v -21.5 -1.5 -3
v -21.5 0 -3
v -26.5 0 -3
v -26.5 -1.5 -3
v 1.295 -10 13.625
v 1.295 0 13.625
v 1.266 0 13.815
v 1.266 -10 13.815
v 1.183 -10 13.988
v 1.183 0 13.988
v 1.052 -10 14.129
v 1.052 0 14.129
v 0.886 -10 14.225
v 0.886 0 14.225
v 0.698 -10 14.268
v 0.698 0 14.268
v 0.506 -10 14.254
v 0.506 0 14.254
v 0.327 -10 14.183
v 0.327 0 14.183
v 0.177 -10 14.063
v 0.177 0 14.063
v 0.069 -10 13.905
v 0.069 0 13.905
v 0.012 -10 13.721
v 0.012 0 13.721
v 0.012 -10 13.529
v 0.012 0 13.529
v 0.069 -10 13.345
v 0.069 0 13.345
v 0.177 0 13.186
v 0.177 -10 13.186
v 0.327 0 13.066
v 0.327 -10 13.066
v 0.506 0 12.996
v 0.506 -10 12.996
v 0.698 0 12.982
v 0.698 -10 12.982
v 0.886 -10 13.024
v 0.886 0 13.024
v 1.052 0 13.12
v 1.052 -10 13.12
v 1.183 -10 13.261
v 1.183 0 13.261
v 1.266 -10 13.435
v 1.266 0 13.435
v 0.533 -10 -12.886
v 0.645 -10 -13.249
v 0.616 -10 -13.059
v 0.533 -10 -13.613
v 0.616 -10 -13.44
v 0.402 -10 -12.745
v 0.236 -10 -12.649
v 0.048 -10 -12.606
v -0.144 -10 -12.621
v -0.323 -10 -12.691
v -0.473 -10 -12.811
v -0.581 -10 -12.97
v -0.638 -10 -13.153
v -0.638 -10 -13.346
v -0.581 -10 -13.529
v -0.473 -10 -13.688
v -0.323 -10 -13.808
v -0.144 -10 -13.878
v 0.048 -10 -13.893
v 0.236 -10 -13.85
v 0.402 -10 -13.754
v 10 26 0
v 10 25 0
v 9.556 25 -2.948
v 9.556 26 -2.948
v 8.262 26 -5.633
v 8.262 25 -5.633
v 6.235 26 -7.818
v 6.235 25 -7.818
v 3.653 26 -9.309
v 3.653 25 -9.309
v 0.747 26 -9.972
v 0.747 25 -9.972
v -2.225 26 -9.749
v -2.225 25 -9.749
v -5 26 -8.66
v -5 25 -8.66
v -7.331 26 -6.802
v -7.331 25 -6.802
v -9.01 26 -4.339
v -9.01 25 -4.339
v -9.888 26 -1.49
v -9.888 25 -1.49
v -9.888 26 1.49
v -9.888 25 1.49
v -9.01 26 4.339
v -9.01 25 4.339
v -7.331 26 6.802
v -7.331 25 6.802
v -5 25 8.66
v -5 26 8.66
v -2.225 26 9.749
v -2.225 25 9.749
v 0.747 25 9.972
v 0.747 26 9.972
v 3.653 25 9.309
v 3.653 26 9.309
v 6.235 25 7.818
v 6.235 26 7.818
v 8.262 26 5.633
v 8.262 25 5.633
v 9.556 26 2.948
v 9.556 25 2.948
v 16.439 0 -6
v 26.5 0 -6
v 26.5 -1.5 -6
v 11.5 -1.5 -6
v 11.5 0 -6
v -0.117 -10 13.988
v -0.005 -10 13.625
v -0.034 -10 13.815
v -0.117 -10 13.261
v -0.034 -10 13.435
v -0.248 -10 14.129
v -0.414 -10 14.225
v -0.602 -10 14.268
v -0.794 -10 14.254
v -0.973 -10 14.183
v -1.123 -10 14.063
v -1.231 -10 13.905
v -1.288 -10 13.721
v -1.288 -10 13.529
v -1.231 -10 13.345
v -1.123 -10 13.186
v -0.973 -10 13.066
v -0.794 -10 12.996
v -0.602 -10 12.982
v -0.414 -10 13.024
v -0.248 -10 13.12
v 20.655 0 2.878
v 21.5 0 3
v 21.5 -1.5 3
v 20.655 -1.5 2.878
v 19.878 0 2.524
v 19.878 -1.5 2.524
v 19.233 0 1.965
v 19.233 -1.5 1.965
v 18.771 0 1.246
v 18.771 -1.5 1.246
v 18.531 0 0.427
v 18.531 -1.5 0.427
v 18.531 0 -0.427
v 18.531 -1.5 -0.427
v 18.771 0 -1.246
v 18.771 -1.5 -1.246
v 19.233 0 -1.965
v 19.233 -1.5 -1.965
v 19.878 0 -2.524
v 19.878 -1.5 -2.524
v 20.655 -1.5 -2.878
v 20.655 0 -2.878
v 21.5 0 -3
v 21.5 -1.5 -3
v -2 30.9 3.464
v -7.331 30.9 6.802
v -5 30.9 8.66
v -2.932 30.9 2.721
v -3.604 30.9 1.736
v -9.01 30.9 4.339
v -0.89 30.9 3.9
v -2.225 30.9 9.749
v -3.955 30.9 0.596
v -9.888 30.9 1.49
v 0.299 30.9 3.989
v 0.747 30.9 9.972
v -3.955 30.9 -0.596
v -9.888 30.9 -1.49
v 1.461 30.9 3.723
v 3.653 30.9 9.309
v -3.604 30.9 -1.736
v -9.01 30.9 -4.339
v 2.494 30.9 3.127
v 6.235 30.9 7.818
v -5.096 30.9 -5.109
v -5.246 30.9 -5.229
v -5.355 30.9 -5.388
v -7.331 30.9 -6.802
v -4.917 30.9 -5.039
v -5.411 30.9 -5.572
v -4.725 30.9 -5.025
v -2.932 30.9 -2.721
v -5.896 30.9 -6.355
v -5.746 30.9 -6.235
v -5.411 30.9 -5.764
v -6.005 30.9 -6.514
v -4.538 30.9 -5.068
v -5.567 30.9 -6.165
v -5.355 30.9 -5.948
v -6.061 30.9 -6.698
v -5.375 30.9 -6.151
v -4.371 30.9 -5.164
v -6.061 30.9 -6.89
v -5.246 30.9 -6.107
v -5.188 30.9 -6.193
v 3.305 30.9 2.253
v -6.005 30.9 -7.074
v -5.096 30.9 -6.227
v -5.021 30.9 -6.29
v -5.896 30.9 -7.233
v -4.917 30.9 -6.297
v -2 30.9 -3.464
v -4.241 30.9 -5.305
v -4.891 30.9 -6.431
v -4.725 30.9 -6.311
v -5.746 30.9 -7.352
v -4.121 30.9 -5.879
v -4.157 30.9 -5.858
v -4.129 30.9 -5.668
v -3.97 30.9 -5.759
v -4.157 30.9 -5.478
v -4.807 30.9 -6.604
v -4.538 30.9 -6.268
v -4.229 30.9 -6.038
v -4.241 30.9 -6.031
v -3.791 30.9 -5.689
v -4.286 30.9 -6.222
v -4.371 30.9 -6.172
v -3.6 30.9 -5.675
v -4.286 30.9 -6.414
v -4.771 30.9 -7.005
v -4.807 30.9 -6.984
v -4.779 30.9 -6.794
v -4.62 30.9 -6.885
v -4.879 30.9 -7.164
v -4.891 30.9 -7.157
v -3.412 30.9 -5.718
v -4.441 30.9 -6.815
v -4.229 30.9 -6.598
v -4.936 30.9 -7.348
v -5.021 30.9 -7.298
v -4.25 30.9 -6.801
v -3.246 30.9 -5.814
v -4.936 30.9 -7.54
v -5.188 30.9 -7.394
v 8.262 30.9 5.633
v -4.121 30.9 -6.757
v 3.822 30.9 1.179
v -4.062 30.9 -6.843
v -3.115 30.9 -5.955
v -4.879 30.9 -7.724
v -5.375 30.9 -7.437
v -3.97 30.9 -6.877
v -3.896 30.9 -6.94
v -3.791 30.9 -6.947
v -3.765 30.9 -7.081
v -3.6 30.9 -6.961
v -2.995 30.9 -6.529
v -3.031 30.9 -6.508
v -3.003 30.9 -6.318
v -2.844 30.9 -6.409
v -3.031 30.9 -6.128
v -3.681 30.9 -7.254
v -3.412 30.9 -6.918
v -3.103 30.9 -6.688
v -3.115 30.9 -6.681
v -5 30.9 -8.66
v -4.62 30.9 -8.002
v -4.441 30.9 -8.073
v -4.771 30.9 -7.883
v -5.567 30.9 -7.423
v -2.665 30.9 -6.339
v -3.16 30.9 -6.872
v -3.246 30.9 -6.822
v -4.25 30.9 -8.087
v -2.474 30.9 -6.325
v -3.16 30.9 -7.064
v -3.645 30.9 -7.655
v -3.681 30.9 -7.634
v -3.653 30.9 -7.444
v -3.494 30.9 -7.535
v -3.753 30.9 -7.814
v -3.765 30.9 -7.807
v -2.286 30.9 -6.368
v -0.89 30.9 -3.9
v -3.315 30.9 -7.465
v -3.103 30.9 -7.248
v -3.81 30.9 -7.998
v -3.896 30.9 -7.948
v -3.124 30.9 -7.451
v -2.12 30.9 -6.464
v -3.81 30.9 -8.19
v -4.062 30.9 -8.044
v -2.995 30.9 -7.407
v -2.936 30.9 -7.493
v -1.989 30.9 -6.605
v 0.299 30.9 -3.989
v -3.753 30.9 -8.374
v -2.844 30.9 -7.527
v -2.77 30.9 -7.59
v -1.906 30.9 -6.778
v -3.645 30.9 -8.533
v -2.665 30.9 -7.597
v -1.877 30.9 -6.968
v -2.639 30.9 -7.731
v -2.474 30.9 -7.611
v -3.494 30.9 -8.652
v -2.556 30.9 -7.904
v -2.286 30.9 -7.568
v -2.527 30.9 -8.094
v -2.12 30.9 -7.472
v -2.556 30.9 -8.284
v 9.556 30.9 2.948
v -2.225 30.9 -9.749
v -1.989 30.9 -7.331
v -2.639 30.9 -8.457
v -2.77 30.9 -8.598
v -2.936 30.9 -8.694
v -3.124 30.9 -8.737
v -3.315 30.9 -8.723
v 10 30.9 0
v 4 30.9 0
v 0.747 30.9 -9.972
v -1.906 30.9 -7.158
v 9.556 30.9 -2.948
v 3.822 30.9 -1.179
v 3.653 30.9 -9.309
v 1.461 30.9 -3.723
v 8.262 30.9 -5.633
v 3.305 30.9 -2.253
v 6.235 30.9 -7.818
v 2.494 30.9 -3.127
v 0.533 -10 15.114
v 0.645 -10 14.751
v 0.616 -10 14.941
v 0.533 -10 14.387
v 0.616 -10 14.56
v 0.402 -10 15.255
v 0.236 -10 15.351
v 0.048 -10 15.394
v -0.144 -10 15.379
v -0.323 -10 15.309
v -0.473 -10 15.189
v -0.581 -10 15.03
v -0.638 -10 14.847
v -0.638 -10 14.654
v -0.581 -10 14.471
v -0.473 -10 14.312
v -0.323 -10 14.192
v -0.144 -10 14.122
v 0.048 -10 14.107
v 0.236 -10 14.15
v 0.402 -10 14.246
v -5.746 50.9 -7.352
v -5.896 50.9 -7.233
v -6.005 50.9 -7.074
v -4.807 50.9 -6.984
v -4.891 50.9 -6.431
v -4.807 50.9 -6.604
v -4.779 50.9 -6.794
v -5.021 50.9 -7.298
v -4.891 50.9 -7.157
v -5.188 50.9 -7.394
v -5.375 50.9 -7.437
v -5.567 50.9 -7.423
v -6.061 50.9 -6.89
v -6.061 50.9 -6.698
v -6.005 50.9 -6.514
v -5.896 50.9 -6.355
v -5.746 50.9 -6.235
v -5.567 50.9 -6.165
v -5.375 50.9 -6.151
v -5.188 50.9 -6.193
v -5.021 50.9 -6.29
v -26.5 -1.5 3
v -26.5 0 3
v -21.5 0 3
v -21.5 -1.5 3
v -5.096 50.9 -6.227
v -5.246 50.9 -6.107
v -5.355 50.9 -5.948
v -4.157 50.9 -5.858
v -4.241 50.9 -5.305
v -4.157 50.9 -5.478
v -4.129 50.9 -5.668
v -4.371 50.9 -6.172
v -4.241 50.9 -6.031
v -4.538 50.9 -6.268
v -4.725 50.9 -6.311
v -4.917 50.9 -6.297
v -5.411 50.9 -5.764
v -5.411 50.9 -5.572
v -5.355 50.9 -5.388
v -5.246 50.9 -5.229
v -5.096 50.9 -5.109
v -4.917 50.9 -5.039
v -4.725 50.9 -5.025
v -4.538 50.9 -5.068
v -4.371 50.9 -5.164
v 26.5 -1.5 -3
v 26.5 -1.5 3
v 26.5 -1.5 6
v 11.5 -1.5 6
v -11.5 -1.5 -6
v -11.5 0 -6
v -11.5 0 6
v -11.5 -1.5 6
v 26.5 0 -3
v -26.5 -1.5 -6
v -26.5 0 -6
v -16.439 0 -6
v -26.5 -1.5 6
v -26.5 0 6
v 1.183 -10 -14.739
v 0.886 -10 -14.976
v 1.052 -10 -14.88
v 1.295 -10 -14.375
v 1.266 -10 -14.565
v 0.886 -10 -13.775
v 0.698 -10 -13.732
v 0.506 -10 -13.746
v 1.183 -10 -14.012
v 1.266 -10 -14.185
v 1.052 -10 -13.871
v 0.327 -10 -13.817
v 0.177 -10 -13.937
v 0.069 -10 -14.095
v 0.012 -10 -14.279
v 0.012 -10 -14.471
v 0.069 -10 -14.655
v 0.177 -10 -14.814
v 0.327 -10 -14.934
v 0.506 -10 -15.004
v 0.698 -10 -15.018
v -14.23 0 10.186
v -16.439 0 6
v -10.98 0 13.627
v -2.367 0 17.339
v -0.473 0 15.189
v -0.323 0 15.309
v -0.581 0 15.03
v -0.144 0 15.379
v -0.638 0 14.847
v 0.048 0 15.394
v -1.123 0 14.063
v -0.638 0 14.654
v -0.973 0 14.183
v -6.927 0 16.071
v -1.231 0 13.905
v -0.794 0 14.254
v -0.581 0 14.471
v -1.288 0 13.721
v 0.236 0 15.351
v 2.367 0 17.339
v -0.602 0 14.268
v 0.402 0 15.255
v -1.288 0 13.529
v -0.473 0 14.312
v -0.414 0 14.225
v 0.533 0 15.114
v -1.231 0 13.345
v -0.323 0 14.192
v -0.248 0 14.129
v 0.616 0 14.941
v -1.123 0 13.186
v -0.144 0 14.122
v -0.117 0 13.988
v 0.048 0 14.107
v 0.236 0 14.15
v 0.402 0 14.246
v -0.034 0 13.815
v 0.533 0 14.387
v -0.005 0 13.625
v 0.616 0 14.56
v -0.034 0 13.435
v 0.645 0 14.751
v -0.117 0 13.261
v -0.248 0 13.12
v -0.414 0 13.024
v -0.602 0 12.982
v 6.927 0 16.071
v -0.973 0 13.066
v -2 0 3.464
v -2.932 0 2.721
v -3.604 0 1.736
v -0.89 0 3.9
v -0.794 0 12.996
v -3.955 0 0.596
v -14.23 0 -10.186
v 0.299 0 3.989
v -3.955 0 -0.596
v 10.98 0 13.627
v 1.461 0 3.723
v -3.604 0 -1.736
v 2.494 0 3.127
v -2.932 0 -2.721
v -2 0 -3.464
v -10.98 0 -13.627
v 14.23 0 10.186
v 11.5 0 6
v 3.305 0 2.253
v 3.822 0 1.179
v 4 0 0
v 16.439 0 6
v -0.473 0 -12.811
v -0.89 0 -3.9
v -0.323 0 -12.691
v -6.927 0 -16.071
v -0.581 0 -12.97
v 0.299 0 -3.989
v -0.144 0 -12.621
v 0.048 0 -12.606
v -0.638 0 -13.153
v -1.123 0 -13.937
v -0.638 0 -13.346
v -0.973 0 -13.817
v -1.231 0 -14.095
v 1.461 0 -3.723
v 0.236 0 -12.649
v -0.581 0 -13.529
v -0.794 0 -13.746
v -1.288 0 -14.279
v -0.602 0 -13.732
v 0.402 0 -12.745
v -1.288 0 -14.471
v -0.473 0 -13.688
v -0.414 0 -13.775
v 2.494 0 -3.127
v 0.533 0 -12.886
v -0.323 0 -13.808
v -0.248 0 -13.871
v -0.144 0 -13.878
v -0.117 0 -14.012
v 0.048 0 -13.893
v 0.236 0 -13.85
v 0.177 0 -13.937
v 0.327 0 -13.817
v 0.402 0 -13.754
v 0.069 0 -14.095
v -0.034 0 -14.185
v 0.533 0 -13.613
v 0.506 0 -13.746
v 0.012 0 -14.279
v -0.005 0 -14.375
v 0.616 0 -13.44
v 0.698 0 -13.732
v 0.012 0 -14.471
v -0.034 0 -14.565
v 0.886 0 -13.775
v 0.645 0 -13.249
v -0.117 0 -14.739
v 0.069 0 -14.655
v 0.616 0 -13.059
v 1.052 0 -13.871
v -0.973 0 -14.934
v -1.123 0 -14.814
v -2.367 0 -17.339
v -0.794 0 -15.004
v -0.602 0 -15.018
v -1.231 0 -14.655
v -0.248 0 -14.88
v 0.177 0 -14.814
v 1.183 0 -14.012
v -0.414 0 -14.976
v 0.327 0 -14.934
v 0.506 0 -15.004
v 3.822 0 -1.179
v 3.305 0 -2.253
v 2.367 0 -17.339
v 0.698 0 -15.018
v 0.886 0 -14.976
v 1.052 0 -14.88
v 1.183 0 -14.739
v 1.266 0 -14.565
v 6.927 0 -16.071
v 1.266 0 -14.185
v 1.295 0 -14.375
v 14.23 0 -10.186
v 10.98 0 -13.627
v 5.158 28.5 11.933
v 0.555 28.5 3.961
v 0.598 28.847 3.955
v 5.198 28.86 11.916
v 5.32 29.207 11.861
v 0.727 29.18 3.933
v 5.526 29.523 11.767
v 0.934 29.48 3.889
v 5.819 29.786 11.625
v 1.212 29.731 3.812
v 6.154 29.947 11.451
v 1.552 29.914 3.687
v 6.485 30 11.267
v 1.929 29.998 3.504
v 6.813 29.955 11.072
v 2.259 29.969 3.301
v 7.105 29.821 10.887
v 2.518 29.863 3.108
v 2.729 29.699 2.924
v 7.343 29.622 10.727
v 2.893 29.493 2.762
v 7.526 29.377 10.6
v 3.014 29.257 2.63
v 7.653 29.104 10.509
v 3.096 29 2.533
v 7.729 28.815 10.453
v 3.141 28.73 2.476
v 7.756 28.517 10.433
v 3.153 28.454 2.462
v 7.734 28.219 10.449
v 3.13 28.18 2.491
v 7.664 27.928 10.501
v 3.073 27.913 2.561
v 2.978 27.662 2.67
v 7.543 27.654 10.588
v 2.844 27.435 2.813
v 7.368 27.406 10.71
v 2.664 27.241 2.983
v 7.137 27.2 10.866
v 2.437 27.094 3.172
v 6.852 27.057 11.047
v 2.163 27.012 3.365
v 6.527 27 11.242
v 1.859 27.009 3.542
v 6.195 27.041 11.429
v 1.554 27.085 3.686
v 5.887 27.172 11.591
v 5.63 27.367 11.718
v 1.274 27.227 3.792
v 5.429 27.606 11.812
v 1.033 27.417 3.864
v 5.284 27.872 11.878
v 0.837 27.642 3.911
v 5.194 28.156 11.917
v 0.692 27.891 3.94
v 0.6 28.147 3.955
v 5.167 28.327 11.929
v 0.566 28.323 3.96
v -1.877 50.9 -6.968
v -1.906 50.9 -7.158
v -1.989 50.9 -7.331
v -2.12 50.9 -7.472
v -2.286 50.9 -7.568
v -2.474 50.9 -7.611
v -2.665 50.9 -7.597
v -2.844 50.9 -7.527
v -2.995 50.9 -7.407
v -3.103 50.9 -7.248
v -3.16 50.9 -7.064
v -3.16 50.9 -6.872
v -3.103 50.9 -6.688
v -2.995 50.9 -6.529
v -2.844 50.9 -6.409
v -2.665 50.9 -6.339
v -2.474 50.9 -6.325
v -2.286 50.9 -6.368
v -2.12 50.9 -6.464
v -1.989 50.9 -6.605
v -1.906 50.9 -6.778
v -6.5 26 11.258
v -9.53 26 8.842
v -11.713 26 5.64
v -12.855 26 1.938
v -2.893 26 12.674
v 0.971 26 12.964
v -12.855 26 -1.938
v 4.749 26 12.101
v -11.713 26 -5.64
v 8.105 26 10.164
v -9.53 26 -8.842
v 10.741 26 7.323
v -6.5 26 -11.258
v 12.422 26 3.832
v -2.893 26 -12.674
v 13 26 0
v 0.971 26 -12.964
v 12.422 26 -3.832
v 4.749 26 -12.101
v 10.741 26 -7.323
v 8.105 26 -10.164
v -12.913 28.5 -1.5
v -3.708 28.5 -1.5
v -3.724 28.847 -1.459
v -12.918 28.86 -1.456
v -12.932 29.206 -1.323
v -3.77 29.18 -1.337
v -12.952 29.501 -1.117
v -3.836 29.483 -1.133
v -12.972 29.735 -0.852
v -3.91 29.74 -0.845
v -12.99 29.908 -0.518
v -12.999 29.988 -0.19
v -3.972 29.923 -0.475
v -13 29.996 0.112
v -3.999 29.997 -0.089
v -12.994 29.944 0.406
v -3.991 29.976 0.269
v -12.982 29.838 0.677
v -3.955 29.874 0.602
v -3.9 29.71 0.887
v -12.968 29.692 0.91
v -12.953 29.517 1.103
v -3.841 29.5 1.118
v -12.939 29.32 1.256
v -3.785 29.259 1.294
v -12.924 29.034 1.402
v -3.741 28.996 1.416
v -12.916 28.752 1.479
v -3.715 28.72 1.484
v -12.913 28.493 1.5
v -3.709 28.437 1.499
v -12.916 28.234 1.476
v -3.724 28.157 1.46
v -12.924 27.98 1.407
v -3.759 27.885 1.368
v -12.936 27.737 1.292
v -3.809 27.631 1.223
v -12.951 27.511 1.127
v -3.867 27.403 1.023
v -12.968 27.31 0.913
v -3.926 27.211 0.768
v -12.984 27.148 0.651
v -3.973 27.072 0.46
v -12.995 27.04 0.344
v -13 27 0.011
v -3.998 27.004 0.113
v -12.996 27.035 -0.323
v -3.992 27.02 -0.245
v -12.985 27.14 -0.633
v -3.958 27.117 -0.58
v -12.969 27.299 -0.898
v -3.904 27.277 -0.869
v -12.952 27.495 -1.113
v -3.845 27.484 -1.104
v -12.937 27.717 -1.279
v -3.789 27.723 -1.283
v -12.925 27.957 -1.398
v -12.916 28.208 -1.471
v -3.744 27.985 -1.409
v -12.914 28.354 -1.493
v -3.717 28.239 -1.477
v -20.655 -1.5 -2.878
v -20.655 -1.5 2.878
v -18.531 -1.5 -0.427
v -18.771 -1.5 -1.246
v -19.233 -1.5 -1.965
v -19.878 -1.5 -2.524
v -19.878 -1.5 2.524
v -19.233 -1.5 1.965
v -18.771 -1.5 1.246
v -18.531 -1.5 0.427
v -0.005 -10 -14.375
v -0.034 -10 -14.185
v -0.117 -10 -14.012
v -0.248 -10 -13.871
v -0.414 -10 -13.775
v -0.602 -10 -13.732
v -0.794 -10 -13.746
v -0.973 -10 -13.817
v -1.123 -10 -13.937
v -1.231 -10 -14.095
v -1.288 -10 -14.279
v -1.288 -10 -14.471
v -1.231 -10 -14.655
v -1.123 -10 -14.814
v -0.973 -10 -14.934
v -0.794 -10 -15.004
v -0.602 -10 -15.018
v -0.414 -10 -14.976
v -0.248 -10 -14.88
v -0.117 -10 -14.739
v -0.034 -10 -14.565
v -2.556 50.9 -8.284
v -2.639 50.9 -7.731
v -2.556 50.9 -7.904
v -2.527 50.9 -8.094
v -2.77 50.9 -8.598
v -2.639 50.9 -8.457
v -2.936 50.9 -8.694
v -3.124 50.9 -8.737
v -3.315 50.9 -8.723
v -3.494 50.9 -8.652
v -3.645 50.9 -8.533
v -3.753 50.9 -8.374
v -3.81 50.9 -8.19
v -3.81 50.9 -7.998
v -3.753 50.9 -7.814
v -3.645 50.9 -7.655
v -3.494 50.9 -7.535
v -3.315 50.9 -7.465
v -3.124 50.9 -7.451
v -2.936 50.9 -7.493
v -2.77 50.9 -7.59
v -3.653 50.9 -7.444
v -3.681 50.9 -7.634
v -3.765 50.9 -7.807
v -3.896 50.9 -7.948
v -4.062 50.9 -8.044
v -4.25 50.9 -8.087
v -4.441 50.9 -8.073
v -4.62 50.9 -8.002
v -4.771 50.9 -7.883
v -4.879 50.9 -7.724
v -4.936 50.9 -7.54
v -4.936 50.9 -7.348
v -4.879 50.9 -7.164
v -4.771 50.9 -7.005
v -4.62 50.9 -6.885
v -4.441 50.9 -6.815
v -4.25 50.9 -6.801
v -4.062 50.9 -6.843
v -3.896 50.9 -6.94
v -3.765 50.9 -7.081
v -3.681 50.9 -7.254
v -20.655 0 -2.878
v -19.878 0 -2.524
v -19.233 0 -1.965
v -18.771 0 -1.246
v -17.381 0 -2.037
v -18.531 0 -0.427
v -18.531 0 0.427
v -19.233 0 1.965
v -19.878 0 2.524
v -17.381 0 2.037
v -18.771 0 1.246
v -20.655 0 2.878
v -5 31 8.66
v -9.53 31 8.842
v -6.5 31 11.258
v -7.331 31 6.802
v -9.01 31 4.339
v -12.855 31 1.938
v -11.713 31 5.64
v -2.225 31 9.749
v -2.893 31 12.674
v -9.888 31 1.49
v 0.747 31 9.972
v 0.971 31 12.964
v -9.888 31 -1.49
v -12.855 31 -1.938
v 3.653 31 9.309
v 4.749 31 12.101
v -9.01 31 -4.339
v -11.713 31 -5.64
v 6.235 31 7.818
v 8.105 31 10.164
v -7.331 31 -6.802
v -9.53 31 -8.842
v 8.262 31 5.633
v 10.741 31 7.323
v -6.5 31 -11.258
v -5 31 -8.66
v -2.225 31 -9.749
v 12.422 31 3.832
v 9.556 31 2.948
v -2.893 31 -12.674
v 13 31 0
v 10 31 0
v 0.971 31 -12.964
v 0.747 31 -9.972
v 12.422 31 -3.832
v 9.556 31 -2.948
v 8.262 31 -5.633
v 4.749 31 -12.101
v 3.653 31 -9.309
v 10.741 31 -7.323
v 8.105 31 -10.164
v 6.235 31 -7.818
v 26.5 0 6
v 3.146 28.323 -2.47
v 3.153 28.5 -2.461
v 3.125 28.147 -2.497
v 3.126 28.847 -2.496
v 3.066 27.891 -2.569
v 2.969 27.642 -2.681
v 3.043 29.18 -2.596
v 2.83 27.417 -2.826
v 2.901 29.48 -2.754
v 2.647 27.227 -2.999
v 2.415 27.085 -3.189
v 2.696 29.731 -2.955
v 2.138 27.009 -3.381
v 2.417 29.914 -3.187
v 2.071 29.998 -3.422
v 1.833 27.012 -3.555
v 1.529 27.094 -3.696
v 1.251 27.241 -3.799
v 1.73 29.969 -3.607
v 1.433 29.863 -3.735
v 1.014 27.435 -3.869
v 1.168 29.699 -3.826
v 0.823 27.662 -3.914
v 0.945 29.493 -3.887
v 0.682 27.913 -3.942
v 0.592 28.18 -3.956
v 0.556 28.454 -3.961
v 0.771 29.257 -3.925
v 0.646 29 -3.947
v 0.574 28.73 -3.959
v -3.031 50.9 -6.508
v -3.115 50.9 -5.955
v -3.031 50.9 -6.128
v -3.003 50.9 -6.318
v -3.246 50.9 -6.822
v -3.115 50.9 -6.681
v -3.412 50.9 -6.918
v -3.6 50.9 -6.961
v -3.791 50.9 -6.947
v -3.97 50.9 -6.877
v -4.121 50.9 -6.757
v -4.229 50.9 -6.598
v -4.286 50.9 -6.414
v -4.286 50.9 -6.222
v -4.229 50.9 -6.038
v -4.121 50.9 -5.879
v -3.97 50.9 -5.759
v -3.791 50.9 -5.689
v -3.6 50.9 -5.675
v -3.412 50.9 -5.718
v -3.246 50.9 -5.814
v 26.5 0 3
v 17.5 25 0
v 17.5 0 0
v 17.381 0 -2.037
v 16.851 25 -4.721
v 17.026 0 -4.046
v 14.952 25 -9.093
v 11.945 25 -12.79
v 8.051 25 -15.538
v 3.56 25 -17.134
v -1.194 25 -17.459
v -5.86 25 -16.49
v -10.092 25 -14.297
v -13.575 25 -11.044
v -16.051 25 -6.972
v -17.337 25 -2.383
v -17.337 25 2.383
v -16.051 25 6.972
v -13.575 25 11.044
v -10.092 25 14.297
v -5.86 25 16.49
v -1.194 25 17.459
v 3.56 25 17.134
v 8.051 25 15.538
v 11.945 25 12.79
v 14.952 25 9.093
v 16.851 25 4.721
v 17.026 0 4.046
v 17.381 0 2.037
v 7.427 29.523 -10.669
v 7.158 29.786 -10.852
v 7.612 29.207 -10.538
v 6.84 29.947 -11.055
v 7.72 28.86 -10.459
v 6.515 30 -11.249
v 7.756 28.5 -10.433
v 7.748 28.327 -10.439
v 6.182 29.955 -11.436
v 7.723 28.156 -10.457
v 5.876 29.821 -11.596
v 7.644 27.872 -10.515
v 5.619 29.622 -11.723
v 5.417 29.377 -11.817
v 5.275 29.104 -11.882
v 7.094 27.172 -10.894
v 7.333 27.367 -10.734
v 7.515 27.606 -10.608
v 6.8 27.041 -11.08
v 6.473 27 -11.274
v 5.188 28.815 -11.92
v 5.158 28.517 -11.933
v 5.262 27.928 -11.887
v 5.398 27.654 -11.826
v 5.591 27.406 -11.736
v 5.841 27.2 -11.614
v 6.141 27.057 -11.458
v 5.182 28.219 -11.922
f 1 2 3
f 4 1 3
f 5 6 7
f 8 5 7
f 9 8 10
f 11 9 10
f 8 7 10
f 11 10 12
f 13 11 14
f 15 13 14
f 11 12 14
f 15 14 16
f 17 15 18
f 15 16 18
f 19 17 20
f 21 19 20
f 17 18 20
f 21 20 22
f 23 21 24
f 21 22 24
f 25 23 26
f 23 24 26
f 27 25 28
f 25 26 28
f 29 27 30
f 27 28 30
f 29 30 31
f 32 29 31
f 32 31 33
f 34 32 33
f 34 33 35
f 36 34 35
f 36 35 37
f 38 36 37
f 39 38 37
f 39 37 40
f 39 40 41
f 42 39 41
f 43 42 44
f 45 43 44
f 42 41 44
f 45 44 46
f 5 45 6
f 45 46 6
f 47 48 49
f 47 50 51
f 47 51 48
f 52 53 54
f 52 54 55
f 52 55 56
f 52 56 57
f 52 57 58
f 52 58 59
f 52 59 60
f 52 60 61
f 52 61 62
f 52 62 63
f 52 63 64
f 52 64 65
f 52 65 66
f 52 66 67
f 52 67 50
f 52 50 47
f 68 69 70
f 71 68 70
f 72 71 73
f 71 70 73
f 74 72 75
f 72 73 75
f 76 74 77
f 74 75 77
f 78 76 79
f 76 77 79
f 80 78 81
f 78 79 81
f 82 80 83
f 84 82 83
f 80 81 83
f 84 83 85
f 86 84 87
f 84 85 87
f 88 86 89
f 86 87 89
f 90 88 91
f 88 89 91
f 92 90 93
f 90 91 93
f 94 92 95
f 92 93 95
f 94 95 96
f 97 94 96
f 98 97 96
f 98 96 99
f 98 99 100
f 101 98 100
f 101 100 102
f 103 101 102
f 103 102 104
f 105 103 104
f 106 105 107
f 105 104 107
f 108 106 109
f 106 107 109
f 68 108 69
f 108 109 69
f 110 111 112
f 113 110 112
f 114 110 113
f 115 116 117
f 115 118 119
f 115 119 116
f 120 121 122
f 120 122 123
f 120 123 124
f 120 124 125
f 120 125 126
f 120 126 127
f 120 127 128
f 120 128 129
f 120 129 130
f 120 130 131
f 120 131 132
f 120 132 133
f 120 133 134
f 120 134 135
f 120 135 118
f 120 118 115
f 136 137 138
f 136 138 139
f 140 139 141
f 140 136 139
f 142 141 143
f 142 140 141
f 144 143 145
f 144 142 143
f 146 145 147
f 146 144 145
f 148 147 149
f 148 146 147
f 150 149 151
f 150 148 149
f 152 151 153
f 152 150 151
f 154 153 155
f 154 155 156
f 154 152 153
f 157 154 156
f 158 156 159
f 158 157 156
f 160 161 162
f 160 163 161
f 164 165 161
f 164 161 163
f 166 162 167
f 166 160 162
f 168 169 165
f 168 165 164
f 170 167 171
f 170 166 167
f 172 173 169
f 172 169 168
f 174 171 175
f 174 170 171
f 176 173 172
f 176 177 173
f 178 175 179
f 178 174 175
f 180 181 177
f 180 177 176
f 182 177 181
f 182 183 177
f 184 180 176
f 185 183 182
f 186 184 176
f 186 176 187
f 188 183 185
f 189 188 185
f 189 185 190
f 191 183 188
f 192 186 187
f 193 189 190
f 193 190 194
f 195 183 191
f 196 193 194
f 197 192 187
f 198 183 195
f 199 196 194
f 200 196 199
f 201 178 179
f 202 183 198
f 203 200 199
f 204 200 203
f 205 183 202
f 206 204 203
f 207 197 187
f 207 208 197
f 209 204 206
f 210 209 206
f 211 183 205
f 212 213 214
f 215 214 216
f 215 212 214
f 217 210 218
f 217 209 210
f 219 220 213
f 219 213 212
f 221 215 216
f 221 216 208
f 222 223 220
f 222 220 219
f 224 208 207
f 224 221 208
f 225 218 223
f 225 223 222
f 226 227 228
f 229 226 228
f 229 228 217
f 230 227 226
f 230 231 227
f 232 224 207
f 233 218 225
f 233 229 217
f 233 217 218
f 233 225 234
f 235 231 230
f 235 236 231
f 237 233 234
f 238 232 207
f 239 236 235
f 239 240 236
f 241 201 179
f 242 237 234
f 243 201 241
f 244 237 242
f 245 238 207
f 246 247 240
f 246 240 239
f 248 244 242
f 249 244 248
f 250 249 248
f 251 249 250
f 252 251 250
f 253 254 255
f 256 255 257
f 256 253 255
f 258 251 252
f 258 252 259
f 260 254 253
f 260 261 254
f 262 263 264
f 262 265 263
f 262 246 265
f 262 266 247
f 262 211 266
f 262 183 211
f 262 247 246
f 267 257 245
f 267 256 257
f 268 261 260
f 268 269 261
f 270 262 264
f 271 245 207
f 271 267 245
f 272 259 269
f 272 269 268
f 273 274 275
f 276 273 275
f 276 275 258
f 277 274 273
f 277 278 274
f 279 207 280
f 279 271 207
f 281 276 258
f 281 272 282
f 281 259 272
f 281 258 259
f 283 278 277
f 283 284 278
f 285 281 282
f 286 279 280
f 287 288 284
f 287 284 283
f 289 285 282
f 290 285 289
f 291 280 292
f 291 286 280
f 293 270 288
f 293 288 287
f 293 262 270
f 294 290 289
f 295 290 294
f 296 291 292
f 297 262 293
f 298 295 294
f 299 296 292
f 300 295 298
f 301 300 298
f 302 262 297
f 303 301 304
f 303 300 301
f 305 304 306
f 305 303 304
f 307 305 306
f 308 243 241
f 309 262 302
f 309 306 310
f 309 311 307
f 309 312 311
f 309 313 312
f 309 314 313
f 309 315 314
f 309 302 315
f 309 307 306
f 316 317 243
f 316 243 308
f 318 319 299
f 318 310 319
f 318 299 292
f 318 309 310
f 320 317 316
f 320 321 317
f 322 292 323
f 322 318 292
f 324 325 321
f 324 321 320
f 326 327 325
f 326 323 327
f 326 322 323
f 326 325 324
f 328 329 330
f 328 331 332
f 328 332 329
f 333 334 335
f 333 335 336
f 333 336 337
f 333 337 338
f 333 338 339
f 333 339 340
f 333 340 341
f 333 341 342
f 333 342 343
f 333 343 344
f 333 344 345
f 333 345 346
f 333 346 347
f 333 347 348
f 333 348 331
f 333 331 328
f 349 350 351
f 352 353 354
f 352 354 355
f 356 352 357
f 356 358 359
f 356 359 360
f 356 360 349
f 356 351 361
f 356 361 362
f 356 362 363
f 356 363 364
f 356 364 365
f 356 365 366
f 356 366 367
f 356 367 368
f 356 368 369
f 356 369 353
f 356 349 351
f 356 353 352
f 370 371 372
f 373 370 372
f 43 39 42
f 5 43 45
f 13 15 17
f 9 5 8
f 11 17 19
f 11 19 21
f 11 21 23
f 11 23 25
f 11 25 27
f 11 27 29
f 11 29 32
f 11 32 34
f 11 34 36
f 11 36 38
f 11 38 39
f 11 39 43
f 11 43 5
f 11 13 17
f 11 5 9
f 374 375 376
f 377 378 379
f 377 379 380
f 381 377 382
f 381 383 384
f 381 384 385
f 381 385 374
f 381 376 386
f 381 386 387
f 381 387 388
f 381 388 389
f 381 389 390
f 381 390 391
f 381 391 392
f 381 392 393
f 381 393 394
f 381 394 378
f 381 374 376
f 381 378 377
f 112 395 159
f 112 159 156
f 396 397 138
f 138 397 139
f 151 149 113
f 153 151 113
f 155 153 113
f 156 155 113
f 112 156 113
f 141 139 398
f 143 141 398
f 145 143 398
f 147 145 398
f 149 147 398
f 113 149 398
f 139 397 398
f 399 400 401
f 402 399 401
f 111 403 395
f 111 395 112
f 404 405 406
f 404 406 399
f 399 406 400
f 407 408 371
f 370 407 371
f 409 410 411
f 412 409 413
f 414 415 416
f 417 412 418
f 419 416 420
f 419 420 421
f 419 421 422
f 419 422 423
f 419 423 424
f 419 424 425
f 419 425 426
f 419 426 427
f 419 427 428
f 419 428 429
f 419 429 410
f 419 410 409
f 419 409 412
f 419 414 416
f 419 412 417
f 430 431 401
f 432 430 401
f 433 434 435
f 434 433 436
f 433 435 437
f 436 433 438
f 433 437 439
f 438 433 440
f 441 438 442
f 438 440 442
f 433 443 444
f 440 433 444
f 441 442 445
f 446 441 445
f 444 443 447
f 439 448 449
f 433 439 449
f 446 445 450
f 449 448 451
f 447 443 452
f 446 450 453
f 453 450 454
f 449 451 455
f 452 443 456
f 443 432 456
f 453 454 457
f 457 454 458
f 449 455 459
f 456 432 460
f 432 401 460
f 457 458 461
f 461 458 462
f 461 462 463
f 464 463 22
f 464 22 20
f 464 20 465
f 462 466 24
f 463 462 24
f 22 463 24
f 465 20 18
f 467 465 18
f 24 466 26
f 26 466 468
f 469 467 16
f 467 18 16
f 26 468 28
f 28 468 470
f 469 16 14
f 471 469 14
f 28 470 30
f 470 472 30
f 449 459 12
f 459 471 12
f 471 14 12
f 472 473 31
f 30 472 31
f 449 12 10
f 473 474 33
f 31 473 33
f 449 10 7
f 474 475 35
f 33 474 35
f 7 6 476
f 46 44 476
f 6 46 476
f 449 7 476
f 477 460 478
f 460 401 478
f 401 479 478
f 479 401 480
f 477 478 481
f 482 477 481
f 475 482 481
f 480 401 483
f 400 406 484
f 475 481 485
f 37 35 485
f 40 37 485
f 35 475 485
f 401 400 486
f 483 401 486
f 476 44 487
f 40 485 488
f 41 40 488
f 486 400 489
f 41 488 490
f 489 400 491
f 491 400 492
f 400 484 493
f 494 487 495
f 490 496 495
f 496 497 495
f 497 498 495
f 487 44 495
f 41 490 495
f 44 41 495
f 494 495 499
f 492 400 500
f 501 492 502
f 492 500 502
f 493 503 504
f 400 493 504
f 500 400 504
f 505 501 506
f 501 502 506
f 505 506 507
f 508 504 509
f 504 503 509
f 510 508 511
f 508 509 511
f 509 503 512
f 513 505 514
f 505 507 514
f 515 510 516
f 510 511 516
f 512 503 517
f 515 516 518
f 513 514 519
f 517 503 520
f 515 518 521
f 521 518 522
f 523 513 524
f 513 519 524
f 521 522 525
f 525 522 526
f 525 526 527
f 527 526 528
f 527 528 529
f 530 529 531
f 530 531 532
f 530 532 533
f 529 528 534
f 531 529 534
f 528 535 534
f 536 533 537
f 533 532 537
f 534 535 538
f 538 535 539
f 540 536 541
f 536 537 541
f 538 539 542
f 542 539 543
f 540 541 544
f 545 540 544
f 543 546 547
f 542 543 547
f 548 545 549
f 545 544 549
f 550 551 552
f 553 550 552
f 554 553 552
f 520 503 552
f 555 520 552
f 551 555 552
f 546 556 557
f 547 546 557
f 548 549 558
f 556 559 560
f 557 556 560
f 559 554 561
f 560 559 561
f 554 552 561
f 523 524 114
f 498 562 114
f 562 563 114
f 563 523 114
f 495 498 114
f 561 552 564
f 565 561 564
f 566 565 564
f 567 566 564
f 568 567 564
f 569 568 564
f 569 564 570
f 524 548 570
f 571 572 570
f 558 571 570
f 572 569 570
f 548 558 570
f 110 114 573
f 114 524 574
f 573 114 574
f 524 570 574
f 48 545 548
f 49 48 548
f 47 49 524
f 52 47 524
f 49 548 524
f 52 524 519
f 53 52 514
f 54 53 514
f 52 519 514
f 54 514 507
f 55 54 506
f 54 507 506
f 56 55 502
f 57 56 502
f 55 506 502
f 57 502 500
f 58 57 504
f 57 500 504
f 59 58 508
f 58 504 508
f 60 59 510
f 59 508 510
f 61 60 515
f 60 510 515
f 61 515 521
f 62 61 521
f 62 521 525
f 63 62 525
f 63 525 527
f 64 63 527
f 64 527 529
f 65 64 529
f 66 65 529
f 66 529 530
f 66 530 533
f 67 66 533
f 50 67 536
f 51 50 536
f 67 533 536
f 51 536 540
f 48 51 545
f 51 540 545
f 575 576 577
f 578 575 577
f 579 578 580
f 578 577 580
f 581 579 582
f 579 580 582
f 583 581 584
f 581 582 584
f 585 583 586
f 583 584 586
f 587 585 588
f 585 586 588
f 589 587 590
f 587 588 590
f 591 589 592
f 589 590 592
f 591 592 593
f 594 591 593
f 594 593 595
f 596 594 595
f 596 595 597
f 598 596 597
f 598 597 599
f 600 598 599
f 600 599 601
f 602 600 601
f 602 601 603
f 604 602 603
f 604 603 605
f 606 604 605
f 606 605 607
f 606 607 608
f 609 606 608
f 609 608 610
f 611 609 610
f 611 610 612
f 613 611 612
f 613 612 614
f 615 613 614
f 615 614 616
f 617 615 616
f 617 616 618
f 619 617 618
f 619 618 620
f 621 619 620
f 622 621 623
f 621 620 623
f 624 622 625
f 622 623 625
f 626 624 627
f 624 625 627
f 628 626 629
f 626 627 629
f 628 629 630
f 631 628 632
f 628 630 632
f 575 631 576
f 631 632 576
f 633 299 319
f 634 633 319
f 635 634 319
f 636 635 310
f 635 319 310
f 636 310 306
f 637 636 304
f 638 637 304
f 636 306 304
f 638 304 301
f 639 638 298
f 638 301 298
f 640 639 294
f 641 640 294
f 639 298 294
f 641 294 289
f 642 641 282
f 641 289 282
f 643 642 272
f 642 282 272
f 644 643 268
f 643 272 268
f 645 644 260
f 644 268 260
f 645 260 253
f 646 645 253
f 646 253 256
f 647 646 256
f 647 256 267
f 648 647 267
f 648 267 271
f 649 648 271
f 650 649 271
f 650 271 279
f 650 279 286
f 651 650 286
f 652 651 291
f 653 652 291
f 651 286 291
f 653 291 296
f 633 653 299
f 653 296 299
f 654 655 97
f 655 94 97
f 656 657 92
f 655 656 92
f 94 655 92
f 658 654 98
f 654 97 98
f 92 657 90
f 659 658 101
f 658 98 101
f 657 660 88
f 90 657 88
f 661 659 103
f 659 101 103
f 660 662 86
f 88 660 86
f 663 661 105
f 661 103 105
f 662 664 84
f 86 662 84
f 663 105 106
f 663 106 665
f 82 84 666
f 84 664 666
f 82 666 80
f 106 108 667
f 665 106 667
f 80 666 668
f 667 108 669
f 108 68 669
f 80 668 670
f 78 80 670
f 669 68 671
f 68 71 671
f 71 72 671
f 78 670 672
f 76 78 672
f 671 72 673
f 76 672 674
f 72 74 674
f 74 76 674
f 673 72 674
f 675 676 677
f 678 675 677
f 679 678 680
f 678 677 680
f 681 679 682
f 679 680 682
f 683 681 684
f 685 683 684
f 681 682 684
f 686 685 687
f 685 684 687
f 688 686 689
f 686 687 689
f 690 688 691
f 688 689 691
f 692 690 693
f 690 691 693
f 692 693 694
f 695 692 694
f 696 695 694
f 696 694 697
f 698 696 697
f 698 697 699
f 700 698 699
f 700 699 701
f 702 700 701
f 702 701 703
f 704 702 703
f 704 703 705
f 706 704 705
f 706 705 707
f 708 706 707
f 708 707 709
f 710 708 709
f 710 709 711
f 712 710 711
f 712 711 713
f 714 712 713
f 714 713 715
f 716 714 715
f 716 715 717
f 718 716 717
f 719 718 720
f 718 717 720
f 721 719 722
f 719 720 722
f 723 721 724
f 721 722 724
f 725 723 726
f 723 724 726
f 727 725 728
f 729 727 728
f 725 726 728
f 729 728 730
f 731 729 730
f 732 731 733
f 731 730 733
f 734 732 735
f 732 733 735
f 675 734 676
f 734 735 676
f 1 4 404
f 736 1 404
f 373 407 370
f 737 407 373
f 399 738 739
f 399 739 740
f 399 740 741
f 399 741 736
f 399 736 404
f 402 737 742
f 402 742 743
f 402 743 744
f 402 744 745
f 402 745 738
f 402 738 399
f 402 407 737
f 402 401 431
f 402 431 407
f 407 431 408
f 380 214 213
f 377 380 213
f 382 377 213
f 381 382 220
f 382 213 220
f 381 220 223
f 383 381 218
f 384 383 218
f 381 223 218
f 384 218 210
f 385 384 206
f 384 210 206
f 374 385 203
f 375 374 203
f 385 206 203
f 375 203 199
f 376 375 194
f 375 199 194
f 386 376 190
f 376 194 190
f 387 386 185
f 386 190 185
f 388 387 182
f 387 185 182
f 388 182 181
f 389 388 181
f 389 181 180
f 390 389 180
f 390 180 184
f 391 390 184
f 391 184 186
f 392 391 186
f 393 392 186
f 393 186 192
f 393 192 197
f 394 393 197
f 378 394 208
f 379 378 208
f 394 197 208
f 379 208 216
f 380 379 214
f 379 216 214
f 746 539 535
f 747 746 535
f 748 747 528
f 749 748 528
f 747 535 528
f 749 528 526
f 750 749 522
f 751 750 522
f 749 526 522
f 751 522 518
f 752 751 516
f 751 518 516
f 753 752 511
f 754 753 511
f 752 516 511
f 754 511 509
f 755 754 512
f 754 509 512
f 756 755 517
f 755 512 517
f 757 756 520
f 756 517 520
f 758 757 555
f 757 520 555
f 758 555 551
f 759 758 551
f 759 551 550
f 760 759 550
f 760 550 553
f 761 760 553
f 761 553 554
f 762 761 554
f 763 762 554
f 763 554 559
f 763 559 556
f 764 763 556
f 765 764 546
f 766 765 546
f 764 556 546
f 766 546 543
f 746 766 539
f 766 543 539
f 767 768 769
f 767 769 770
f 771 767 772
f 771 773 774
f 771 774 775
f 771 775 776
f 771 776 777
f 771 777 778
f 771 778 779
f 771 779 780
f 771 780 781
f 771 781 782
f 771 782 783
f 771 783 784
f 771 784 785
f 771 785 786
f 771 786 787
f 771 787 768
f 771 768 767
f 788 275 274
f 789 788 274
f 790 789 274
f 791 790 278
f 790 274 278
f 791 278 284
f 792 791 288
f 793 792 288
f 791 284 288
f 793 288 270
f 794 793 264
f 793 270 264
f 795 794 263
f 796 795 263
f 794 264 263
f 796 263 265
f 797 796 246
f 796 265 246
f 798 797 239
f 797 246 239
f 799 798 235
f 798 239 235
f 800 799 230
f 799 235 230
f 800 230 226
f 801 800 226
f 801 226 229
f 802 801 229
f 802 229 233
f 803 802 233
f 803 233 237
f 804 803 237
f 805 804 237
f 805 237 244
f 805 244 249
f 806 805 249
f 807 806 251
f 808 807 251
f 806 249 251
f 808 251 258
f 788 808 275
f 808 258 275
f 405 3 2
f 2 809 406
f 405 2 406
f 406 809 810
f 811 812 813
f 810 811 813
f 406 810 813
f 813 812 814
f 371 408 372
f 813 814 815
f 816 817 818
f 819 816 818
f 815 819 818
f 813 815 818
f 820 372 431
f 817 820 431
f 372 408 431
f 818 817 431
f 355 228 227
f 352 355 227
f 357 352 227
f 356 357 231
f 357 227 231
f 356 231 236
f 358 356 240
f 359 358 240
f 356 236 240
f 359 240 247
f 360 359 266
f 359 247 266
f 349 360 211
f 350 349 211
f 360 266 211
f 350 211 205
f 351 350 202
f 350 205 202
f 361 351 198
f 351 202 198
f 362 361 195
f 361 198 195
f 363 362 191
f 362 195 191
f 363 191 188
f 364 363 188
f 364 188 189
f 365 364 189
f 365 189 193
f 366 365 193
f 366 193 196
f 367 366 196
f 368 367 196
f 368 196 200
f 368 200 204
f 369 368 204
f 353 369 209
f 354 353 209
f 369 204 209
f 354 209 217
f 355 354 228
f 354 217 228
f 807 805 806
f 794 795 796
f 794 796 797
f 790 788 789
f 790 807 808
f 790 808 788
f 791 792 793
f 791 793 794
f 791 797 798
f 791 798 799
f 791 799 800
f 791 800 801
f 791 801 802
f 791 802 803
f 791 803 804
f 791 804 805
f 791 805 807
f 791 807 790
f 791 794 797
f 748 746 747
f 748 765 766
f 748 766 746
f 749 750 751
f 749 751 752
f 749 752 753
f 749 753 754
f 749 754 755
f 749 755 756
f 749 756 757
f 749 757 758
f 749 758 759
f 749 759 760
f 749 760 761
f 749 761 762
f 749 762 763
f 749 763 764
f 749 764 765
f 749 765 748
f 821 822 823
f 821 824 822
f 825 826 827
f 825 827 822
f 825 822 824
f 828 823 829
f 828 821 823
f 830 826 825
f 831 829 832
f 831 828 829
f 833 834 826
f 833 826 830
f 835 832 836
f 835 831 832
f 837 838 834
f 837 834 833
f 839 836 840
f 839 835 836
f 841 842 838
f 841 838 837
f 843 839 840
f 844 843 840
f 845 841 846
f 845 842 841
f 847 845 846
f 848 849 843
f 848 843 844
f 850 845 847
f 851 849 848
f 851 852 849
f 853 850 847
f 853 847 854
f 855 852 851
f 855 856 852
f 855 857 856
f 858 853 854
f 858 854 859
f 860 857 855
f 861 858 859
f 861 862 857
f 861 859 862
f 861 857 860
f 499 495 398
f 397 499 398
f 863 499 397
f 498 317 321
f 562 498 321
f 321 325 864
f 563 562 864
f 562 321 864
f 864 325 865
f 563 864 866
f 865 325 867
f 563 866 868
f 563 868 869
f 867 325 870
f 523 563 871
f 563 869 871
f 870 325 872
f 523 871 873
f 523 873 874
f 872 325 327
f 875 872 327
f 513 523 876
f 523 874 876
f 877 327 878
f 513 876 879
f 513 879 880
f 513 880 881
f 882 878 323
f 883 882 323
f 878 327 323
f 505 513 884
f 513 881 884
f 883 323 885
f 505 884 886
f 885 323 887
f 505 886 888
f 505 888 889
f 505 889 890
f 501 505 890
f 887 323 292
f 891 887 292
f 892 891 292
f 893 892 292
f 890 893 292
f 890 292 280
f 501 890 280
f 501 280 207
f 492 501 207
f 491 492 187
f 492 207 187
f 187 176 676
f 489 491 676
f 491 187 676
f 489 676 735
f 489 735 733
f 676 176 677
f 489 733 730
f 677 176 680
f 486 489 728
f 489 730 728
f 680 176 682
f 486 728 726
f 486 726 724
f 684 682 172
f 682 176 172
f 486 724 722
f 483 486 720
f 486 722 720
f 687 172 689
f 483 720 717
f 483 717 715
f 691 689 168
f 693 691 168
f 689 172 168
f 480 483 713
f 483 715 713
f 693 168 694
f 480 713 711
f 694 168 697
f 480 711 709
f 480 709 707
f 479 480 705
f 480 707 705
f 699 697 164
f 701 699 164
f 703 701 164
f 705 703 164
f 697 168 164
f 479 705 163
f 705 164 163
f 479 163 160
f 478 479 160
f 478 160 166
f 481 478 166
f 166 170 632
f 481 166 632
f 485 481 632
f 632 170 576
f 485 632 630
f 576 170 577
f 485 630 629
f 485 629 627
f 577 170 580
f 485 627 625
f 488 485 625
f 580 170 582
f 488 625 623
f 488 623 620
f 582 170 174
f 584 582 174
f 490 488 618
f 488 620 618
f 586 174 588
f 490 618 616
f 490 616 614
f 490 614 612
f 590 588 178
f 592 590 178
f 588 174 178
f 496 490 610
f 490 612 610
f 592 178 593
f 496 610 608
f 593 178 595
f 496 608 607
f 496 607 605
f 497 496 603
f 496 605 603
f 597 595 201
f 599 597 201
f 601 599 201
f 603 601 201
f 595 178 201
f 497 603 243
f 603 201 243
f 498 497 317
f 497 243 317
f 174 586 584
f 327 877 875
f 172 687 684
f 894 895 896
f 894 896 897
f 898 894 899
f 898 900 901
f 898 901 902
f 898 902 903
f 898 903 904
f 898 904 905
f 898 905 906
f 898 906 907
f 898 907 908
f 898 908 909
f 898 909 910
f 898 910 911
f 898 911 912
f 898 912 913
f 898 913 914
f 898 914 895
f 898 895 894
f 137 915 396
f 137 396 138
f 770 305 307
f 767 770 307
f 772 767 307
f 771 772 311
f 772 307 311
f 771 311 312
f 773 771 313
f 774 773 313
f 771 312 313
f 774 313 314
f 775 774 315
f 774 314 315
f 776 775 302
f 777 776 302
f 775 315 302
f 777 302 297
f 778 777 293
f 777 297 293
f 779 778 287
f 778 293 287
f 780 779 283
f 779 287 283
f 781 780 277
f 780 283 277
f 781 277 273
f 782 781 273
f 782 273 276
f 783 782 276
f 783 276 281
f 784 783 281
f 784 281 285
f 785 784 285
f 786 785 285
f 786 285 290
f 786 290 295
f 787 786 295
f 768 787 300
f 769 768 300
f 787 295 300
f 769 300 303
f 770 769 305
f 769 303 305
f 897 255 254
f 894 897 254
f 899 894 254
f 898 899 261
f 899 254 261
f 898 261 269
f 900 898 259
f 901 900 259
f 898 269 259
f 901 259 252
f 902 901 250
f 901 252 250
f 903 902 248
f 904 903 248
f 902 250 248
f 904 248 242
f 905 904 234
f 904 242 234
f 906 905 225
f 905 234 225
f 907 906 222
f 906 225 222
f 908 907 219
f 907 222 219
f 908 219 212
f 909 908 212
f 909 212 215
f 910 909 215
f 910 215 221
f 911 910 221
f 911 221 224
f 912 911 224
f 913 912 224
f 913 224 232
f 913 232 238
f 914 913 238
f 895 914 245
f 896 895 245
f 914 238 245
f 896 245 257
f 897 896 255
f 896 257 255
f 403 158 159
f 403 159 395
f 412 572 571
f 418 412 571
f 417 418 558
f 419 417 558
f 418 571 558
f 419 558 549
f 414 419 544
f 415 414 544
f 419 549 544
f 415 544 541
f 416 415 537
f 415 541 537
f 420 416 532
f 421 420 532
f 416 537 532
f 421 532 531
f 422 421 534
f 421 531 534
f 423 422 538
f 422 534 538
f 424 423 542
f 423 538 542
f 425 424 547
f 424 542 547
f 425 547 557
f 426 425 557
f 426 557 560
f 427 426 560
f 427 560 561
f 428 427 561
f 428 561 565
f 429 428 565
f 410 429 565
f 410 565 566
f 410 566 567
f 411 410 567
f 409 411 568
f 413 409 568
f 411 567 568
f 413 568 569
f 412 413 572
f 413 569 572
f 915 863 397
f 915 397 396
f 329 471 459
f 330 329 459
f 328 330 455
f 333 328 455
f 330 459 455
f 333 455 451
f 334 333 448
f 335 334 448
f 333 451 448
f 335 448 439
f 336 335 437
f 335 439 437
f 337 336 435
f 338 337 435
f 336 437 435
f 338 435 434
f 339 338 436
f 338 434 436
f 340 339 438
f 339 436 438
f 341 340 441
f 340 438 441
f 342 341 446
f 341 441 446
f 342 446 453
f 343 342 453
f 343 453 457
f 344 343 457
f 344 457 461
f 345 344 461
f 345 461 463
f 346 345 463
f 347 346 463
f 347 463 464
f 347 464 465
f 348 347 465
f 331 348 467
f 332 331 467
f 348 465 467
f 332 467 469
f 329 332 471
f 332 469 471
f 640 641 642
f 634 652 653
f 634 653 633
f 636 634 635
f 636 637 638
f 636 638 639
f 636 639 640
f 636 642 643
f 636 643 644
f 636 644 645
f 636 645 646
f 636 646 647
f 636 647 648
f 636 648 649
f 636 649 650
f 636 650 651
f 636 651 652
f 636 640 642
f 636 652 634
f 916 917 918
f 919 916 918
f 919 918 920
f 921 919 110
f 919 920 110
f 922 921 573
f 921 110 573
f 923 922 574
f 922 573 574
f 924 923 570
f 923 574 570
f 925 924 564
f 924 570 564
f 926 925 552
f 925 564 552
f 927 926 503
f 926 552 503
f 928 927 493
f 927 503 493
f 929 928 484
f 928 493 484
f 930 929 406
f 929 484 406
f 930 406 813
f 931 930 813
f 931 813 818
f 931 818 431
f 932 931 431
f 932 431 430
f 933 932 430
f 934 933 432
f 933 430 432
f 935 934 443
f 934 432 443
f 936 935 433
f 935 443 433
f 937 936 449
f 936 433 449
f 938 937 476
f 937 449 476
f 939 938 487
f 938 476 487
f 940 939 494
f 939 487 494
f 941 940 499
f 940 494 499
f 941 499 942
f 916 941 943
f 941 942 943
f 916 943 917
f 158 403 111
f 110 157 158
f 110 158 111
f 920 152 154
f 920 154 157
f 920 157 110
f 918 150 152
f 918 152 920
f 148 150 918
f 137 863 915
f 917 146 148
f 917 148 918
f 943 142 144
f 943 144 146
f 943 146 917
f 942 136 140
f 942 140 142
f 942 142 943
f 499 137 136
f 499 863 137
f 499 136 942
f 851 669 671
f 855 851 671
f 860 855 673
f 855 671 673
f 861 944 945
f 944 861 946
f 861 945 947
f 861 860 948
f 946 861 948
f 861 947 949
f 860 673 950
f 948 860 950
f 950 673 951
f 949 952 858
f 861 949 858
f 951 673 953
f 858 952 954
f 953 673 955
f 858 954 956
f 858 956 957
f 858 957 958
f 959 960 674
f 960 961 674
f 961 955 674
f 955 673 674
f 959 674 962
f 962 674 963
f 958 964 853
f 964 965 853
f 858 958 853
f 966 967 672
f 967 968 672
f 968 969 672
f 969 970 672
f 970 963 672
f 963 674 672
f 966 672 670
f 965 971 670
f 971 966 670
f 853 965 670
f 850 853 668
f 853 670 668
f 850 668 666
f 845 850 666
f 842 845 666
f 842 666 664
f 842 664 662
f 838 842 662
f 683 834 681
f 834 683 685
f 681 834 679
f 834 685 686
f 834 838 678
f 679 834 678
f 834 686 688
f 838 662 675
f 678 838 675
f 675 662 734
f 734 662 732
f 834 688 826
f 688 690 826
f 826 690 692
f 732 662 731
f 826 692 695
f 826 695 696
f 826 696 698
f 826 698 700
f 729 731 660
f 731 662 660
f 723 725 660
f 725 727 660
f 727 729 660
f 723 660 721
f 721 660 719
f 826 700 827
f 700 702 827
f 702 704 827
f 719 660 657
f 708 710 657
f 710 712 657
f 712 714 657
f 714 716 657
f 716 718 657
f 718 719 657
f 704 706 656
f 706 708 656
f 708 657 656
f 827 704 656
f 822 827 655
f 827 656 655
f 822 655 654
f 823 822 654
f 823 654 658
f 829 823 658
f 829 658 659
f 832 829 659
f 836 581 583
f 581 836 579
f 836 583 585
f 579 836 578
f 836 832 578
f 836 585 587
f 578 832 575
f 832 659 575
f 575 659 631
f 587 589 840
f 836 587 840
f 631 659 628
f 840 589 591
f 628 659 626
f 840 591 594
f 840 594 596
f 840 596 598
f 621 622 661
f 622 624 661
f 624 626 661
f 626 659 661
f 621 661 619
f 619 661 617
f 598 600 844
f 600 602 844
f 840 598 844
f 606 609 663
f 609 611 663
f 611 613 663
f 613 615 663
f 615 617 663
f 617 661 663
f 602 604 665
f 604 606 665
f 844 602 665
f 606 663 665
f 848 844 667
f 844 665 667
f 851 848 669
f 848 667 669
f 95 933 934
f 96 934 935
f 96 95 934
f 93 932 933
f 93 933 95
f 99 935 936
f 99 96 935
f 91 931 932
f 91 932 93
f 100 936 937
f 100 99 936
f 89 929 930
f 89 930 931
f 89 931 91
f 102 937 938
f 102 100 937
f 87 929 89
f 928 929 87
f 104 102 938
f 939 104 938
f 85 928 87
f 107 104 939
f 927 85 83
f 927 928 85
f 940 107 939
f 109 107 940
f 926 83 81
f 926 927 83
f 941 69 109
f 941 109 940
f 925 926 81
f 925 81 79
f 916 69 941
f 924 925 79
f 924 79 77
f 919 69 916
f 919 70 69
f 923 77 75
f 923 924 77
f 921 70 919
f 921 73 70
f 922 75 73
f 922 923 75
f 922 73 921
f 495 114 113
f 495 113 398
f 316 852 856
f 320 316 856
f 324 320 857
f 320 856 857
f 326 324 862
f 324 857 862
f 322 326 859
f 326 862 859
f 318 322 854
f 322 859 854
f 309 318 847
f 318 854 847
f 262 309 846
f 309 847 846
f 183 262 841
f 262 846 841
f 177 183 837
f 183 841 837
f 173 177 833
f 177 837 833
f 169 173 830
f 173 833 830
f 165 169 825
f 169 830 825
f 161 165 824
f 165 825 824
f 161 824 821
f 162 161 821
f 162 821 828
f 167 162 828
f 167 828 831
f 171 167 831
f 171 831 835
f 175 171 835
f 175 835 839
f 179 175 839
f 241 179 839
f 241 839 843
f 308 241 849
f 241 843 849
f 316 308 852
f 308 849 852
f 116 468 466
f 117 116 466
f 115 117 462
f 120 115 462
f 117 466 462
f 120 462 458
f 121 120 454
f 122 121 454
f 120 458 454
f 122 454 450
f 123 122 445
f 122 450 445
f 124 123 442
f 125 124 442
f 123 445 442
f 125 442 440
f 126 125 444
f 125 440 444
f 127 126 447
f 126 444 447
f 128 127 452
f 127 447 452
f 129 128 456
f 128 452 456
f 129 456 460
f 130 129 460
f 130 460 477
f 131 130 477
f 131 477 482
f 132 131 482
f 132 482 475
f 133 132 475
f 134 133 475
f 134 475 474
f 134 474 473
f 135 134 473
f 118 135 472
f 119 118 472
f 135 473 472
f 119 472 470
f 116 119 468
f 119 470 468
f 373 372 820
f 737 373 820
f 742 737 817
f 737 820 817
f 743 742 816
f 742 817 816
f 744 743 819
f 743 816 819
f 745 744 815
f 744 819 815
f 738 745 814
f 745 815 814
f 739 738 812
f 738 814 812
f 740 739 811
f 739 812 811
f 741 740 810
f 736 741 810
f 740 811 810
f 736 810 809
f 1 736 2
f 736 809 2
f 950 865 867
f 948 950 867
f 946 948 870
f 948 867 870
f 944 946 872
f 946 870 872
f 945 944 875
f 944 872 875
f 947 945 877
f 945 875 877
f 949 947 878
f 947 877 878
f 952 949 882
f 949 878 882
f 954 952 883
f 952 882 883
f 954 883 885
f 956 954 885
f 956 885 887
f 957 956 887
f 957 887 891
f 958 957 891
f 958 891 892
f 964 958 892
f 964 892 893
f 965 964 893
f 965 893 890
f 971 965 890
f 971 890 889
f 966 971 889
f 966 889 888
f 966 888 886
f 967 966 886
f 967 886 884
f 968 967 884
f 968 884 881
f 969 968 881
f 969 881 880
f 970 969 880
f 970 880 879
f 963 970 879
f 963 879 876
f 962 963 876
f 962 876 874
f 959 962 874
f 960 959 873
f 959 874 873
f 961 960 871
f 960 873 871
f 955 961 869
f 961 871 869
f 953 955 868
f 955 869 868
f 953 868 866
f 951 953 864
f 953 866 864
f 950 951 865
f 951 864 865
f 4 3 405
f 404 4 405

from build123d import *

# Parameters (mm, degrees)
SKETCH_1_R               = 17.5
EXTRUDE_1_DEPTH          = 25
SKETCH_2_R               = 10
EXTRUDE_2_DEPTH          = 1
SKETCH_3_R               = 13
EXTRUDE_3_DEPTH          = 5
SKETCH_4_R               = 4
CUT_EXTRUDE_1_DEPTH      = 47
SKETCH_5_R               = 1.5
CUT_EXTRUDE_2_DEPTH      = 47
PATTERN_CIRCULAR_1_COUNT = 3
SKETCH_8_R               = 10
CUT_EXTRUDE_3_DEPTH      = 0.1
SKETCH_9_R               = 0.645
EXTRUDE_4_DEPTH          = 20
SKETCH_10_R              = 0.645
EXTRUDE_5_DEPTH          = 10
EXTRUDE_6_DEPTH          = 1.5


with BuildPart() as part:
    # 草图1 → 凸台-拉伸1 (new body)
    with BuildSketch(Plane(origin=(0, 0, 0), x_dir=(1, 0, 0), z_dir=(0, 1, 0))):
        Circle(SKETCH_1_R)
    extrude(amount=EXTRUDE_1_DEPTH)

    # 草图2 → 凸台-拉伸2 (add)
    with BuildSketch(Plane(origin=(0, 25, 0), x_dir=(1, 0, 0), z_dir=(0, 1, 0))):
        Circle(SKETCH_2_R)
    extrude(amount=EXTRUDE_2_DEPTH)

    # 草图3 → 凸台-拉伸3 (add)
    with BuildSketch(Plane(origin=(0, 26, 0), x_dir=(1, 0, 0), z_dir=(0, 1, 0))):
        Circle(SKETCH_3_R)
    extrude(amount=EXTRUDE_3_DEPTH)

    # 草图4 → 切除-拉伸1 (cut)
    with BuildSketch(Plane(origin=(0, 31, 0), x_dir=(1, 0, 0), z_dir=(0, 1, 0))):
        Circle(SKETCH_4_R)
    extrude(amount=-CUT_EXTRUDE_1_DEPTH, mode=Mode.SUBTRACT)

    # 草图5 → 切除-拉伸2 (cut)
    with BuildSketch(Plane(origin=(0, 0, 0), x_dir=(0, 0, -1), z_dir=(1, 0, 0))):
        with Locations((0, 28.5)):
            Circle(SKETCH_5_R)
    cut_extrude_2 = extrude(amount=-CUT_EXTRUDE_2_DEPTH, mode=Mode.SUBTRACT)

    # 阵列(圆周)1: 切除-拉伸2 ×3 about axis
    pattern_circular_1_axis = Axis((0, 39.080777009, 0), (0, -1, 0))
    for i in range(1, PATTERN_CIRCULAR_1_COUNT):
        add(cut_extrude_2.rotate(pattern_circular_1_axis, i * 360 / PATTERN_CIRCULAR_1_COUNT), mode=Mode.SUBTRACT)

    # 草图8 → 切除-拉伸3 (cut)
    with BuildSketch(Plane(origin=(0, 31, 0), x_dir=(1, 0, 0), z_dir=(0, 1, 0))):
        Circle(SKETCH_8_R)
    extrude(amount=-CUT_EXTRUDE_3_DEPTH, mode=Mode.SUBTRACT)

    # 草图9 → 凸台-拉伸4 (add)
    with BuildSketch(Plane(origin=(0, 30.9, 0), x_dir=(1, 0, 0), z_dir=(0, 1, 0))):
        with Locations((-5.423552013, 6.793867644)):
            Circle(SKETCH_9_R)
        with Locations((-4.297718988, 7.443867644)):
            Circle(SKETCH_9_R)
        with Locations((-3.171885963, 8.093867644)):
            Circle(SKETCH_9_R)
        with Locations((-4.773552013, 5.668034619)):
            Circle(SKETCH_9_R)
        with Locations((-3.647718988, 6.318034619)):
            Circle(SKETCH_9_R)
        with Locations((-2.521885963, 6.968034619)):
            Circle(SKETCH_9_R)
    extrude(amount=EXTRUDE_4_DEPTH)

    # 草图10 → 凸台-拉伸5 (add)
    with BuildSketch(Plane.XZ):
        with Locations((0.65, 13.624722325)):
            Circle(SKETCH_10_R)
        with Locations((-0.65, 13.624722325)):
            Circle(SKETCH_10_R)
        with Locations((0, 14.75055535)):
            Circle(SKETCH_10_R)
        with Locations((0.65, -14.375277675)):
            Circle(SKETCH_10_R)
        with Locations((-0.65, -14.375277675)):
            Circle(SKETCH_10_R)
        with Locations((0, -13.24944465)):
            Circle(SKETCH_10_R)
    extrude(amount=EXTRUDE_5_DEPTH)

    # 草图11 → 凸台-拉伸6 (add)
    with BuildSketch(Plane.XZ):
        with BuildLine():
            Line((-26.5, 3), (-21.5, 3))
            ThreePointArc((-21.5, 3), (-18.5, 0), (-21.5, -3))
            Line((-21.5, -3), (-26.5, -3))
            Line((-26.5, -3), (-26.5, -6))
            Line((-26.5, -6), (-11.5, -6))
            Line((-11.5, -6), (-11.5, 6))
            Line((-11.5, 6), (-26.5, 6))
            Line((-26.5, 6), (-26.5, 3))
        make_face()
        with BuildLine():
            Line((11.5, -6), (11.5, 6))
            Line((11.5, 6), (26.5, 6))
            Line((26.5, 6), (26.5, 3))
            Line((26.5, 3), (21.5, 3))
            ThreePointArc((21.5, 3), (18.5, 0), (21.5, -3))
            Line((21.5, -3), (26.5, -3))
            Line((26.5, -3), (26.5, -6))
            Line((26.5, -6), (11.5, -6))
        make_face()
    extrude(amount=EXTRUDE_6_DEPTH)


solid = part.part
